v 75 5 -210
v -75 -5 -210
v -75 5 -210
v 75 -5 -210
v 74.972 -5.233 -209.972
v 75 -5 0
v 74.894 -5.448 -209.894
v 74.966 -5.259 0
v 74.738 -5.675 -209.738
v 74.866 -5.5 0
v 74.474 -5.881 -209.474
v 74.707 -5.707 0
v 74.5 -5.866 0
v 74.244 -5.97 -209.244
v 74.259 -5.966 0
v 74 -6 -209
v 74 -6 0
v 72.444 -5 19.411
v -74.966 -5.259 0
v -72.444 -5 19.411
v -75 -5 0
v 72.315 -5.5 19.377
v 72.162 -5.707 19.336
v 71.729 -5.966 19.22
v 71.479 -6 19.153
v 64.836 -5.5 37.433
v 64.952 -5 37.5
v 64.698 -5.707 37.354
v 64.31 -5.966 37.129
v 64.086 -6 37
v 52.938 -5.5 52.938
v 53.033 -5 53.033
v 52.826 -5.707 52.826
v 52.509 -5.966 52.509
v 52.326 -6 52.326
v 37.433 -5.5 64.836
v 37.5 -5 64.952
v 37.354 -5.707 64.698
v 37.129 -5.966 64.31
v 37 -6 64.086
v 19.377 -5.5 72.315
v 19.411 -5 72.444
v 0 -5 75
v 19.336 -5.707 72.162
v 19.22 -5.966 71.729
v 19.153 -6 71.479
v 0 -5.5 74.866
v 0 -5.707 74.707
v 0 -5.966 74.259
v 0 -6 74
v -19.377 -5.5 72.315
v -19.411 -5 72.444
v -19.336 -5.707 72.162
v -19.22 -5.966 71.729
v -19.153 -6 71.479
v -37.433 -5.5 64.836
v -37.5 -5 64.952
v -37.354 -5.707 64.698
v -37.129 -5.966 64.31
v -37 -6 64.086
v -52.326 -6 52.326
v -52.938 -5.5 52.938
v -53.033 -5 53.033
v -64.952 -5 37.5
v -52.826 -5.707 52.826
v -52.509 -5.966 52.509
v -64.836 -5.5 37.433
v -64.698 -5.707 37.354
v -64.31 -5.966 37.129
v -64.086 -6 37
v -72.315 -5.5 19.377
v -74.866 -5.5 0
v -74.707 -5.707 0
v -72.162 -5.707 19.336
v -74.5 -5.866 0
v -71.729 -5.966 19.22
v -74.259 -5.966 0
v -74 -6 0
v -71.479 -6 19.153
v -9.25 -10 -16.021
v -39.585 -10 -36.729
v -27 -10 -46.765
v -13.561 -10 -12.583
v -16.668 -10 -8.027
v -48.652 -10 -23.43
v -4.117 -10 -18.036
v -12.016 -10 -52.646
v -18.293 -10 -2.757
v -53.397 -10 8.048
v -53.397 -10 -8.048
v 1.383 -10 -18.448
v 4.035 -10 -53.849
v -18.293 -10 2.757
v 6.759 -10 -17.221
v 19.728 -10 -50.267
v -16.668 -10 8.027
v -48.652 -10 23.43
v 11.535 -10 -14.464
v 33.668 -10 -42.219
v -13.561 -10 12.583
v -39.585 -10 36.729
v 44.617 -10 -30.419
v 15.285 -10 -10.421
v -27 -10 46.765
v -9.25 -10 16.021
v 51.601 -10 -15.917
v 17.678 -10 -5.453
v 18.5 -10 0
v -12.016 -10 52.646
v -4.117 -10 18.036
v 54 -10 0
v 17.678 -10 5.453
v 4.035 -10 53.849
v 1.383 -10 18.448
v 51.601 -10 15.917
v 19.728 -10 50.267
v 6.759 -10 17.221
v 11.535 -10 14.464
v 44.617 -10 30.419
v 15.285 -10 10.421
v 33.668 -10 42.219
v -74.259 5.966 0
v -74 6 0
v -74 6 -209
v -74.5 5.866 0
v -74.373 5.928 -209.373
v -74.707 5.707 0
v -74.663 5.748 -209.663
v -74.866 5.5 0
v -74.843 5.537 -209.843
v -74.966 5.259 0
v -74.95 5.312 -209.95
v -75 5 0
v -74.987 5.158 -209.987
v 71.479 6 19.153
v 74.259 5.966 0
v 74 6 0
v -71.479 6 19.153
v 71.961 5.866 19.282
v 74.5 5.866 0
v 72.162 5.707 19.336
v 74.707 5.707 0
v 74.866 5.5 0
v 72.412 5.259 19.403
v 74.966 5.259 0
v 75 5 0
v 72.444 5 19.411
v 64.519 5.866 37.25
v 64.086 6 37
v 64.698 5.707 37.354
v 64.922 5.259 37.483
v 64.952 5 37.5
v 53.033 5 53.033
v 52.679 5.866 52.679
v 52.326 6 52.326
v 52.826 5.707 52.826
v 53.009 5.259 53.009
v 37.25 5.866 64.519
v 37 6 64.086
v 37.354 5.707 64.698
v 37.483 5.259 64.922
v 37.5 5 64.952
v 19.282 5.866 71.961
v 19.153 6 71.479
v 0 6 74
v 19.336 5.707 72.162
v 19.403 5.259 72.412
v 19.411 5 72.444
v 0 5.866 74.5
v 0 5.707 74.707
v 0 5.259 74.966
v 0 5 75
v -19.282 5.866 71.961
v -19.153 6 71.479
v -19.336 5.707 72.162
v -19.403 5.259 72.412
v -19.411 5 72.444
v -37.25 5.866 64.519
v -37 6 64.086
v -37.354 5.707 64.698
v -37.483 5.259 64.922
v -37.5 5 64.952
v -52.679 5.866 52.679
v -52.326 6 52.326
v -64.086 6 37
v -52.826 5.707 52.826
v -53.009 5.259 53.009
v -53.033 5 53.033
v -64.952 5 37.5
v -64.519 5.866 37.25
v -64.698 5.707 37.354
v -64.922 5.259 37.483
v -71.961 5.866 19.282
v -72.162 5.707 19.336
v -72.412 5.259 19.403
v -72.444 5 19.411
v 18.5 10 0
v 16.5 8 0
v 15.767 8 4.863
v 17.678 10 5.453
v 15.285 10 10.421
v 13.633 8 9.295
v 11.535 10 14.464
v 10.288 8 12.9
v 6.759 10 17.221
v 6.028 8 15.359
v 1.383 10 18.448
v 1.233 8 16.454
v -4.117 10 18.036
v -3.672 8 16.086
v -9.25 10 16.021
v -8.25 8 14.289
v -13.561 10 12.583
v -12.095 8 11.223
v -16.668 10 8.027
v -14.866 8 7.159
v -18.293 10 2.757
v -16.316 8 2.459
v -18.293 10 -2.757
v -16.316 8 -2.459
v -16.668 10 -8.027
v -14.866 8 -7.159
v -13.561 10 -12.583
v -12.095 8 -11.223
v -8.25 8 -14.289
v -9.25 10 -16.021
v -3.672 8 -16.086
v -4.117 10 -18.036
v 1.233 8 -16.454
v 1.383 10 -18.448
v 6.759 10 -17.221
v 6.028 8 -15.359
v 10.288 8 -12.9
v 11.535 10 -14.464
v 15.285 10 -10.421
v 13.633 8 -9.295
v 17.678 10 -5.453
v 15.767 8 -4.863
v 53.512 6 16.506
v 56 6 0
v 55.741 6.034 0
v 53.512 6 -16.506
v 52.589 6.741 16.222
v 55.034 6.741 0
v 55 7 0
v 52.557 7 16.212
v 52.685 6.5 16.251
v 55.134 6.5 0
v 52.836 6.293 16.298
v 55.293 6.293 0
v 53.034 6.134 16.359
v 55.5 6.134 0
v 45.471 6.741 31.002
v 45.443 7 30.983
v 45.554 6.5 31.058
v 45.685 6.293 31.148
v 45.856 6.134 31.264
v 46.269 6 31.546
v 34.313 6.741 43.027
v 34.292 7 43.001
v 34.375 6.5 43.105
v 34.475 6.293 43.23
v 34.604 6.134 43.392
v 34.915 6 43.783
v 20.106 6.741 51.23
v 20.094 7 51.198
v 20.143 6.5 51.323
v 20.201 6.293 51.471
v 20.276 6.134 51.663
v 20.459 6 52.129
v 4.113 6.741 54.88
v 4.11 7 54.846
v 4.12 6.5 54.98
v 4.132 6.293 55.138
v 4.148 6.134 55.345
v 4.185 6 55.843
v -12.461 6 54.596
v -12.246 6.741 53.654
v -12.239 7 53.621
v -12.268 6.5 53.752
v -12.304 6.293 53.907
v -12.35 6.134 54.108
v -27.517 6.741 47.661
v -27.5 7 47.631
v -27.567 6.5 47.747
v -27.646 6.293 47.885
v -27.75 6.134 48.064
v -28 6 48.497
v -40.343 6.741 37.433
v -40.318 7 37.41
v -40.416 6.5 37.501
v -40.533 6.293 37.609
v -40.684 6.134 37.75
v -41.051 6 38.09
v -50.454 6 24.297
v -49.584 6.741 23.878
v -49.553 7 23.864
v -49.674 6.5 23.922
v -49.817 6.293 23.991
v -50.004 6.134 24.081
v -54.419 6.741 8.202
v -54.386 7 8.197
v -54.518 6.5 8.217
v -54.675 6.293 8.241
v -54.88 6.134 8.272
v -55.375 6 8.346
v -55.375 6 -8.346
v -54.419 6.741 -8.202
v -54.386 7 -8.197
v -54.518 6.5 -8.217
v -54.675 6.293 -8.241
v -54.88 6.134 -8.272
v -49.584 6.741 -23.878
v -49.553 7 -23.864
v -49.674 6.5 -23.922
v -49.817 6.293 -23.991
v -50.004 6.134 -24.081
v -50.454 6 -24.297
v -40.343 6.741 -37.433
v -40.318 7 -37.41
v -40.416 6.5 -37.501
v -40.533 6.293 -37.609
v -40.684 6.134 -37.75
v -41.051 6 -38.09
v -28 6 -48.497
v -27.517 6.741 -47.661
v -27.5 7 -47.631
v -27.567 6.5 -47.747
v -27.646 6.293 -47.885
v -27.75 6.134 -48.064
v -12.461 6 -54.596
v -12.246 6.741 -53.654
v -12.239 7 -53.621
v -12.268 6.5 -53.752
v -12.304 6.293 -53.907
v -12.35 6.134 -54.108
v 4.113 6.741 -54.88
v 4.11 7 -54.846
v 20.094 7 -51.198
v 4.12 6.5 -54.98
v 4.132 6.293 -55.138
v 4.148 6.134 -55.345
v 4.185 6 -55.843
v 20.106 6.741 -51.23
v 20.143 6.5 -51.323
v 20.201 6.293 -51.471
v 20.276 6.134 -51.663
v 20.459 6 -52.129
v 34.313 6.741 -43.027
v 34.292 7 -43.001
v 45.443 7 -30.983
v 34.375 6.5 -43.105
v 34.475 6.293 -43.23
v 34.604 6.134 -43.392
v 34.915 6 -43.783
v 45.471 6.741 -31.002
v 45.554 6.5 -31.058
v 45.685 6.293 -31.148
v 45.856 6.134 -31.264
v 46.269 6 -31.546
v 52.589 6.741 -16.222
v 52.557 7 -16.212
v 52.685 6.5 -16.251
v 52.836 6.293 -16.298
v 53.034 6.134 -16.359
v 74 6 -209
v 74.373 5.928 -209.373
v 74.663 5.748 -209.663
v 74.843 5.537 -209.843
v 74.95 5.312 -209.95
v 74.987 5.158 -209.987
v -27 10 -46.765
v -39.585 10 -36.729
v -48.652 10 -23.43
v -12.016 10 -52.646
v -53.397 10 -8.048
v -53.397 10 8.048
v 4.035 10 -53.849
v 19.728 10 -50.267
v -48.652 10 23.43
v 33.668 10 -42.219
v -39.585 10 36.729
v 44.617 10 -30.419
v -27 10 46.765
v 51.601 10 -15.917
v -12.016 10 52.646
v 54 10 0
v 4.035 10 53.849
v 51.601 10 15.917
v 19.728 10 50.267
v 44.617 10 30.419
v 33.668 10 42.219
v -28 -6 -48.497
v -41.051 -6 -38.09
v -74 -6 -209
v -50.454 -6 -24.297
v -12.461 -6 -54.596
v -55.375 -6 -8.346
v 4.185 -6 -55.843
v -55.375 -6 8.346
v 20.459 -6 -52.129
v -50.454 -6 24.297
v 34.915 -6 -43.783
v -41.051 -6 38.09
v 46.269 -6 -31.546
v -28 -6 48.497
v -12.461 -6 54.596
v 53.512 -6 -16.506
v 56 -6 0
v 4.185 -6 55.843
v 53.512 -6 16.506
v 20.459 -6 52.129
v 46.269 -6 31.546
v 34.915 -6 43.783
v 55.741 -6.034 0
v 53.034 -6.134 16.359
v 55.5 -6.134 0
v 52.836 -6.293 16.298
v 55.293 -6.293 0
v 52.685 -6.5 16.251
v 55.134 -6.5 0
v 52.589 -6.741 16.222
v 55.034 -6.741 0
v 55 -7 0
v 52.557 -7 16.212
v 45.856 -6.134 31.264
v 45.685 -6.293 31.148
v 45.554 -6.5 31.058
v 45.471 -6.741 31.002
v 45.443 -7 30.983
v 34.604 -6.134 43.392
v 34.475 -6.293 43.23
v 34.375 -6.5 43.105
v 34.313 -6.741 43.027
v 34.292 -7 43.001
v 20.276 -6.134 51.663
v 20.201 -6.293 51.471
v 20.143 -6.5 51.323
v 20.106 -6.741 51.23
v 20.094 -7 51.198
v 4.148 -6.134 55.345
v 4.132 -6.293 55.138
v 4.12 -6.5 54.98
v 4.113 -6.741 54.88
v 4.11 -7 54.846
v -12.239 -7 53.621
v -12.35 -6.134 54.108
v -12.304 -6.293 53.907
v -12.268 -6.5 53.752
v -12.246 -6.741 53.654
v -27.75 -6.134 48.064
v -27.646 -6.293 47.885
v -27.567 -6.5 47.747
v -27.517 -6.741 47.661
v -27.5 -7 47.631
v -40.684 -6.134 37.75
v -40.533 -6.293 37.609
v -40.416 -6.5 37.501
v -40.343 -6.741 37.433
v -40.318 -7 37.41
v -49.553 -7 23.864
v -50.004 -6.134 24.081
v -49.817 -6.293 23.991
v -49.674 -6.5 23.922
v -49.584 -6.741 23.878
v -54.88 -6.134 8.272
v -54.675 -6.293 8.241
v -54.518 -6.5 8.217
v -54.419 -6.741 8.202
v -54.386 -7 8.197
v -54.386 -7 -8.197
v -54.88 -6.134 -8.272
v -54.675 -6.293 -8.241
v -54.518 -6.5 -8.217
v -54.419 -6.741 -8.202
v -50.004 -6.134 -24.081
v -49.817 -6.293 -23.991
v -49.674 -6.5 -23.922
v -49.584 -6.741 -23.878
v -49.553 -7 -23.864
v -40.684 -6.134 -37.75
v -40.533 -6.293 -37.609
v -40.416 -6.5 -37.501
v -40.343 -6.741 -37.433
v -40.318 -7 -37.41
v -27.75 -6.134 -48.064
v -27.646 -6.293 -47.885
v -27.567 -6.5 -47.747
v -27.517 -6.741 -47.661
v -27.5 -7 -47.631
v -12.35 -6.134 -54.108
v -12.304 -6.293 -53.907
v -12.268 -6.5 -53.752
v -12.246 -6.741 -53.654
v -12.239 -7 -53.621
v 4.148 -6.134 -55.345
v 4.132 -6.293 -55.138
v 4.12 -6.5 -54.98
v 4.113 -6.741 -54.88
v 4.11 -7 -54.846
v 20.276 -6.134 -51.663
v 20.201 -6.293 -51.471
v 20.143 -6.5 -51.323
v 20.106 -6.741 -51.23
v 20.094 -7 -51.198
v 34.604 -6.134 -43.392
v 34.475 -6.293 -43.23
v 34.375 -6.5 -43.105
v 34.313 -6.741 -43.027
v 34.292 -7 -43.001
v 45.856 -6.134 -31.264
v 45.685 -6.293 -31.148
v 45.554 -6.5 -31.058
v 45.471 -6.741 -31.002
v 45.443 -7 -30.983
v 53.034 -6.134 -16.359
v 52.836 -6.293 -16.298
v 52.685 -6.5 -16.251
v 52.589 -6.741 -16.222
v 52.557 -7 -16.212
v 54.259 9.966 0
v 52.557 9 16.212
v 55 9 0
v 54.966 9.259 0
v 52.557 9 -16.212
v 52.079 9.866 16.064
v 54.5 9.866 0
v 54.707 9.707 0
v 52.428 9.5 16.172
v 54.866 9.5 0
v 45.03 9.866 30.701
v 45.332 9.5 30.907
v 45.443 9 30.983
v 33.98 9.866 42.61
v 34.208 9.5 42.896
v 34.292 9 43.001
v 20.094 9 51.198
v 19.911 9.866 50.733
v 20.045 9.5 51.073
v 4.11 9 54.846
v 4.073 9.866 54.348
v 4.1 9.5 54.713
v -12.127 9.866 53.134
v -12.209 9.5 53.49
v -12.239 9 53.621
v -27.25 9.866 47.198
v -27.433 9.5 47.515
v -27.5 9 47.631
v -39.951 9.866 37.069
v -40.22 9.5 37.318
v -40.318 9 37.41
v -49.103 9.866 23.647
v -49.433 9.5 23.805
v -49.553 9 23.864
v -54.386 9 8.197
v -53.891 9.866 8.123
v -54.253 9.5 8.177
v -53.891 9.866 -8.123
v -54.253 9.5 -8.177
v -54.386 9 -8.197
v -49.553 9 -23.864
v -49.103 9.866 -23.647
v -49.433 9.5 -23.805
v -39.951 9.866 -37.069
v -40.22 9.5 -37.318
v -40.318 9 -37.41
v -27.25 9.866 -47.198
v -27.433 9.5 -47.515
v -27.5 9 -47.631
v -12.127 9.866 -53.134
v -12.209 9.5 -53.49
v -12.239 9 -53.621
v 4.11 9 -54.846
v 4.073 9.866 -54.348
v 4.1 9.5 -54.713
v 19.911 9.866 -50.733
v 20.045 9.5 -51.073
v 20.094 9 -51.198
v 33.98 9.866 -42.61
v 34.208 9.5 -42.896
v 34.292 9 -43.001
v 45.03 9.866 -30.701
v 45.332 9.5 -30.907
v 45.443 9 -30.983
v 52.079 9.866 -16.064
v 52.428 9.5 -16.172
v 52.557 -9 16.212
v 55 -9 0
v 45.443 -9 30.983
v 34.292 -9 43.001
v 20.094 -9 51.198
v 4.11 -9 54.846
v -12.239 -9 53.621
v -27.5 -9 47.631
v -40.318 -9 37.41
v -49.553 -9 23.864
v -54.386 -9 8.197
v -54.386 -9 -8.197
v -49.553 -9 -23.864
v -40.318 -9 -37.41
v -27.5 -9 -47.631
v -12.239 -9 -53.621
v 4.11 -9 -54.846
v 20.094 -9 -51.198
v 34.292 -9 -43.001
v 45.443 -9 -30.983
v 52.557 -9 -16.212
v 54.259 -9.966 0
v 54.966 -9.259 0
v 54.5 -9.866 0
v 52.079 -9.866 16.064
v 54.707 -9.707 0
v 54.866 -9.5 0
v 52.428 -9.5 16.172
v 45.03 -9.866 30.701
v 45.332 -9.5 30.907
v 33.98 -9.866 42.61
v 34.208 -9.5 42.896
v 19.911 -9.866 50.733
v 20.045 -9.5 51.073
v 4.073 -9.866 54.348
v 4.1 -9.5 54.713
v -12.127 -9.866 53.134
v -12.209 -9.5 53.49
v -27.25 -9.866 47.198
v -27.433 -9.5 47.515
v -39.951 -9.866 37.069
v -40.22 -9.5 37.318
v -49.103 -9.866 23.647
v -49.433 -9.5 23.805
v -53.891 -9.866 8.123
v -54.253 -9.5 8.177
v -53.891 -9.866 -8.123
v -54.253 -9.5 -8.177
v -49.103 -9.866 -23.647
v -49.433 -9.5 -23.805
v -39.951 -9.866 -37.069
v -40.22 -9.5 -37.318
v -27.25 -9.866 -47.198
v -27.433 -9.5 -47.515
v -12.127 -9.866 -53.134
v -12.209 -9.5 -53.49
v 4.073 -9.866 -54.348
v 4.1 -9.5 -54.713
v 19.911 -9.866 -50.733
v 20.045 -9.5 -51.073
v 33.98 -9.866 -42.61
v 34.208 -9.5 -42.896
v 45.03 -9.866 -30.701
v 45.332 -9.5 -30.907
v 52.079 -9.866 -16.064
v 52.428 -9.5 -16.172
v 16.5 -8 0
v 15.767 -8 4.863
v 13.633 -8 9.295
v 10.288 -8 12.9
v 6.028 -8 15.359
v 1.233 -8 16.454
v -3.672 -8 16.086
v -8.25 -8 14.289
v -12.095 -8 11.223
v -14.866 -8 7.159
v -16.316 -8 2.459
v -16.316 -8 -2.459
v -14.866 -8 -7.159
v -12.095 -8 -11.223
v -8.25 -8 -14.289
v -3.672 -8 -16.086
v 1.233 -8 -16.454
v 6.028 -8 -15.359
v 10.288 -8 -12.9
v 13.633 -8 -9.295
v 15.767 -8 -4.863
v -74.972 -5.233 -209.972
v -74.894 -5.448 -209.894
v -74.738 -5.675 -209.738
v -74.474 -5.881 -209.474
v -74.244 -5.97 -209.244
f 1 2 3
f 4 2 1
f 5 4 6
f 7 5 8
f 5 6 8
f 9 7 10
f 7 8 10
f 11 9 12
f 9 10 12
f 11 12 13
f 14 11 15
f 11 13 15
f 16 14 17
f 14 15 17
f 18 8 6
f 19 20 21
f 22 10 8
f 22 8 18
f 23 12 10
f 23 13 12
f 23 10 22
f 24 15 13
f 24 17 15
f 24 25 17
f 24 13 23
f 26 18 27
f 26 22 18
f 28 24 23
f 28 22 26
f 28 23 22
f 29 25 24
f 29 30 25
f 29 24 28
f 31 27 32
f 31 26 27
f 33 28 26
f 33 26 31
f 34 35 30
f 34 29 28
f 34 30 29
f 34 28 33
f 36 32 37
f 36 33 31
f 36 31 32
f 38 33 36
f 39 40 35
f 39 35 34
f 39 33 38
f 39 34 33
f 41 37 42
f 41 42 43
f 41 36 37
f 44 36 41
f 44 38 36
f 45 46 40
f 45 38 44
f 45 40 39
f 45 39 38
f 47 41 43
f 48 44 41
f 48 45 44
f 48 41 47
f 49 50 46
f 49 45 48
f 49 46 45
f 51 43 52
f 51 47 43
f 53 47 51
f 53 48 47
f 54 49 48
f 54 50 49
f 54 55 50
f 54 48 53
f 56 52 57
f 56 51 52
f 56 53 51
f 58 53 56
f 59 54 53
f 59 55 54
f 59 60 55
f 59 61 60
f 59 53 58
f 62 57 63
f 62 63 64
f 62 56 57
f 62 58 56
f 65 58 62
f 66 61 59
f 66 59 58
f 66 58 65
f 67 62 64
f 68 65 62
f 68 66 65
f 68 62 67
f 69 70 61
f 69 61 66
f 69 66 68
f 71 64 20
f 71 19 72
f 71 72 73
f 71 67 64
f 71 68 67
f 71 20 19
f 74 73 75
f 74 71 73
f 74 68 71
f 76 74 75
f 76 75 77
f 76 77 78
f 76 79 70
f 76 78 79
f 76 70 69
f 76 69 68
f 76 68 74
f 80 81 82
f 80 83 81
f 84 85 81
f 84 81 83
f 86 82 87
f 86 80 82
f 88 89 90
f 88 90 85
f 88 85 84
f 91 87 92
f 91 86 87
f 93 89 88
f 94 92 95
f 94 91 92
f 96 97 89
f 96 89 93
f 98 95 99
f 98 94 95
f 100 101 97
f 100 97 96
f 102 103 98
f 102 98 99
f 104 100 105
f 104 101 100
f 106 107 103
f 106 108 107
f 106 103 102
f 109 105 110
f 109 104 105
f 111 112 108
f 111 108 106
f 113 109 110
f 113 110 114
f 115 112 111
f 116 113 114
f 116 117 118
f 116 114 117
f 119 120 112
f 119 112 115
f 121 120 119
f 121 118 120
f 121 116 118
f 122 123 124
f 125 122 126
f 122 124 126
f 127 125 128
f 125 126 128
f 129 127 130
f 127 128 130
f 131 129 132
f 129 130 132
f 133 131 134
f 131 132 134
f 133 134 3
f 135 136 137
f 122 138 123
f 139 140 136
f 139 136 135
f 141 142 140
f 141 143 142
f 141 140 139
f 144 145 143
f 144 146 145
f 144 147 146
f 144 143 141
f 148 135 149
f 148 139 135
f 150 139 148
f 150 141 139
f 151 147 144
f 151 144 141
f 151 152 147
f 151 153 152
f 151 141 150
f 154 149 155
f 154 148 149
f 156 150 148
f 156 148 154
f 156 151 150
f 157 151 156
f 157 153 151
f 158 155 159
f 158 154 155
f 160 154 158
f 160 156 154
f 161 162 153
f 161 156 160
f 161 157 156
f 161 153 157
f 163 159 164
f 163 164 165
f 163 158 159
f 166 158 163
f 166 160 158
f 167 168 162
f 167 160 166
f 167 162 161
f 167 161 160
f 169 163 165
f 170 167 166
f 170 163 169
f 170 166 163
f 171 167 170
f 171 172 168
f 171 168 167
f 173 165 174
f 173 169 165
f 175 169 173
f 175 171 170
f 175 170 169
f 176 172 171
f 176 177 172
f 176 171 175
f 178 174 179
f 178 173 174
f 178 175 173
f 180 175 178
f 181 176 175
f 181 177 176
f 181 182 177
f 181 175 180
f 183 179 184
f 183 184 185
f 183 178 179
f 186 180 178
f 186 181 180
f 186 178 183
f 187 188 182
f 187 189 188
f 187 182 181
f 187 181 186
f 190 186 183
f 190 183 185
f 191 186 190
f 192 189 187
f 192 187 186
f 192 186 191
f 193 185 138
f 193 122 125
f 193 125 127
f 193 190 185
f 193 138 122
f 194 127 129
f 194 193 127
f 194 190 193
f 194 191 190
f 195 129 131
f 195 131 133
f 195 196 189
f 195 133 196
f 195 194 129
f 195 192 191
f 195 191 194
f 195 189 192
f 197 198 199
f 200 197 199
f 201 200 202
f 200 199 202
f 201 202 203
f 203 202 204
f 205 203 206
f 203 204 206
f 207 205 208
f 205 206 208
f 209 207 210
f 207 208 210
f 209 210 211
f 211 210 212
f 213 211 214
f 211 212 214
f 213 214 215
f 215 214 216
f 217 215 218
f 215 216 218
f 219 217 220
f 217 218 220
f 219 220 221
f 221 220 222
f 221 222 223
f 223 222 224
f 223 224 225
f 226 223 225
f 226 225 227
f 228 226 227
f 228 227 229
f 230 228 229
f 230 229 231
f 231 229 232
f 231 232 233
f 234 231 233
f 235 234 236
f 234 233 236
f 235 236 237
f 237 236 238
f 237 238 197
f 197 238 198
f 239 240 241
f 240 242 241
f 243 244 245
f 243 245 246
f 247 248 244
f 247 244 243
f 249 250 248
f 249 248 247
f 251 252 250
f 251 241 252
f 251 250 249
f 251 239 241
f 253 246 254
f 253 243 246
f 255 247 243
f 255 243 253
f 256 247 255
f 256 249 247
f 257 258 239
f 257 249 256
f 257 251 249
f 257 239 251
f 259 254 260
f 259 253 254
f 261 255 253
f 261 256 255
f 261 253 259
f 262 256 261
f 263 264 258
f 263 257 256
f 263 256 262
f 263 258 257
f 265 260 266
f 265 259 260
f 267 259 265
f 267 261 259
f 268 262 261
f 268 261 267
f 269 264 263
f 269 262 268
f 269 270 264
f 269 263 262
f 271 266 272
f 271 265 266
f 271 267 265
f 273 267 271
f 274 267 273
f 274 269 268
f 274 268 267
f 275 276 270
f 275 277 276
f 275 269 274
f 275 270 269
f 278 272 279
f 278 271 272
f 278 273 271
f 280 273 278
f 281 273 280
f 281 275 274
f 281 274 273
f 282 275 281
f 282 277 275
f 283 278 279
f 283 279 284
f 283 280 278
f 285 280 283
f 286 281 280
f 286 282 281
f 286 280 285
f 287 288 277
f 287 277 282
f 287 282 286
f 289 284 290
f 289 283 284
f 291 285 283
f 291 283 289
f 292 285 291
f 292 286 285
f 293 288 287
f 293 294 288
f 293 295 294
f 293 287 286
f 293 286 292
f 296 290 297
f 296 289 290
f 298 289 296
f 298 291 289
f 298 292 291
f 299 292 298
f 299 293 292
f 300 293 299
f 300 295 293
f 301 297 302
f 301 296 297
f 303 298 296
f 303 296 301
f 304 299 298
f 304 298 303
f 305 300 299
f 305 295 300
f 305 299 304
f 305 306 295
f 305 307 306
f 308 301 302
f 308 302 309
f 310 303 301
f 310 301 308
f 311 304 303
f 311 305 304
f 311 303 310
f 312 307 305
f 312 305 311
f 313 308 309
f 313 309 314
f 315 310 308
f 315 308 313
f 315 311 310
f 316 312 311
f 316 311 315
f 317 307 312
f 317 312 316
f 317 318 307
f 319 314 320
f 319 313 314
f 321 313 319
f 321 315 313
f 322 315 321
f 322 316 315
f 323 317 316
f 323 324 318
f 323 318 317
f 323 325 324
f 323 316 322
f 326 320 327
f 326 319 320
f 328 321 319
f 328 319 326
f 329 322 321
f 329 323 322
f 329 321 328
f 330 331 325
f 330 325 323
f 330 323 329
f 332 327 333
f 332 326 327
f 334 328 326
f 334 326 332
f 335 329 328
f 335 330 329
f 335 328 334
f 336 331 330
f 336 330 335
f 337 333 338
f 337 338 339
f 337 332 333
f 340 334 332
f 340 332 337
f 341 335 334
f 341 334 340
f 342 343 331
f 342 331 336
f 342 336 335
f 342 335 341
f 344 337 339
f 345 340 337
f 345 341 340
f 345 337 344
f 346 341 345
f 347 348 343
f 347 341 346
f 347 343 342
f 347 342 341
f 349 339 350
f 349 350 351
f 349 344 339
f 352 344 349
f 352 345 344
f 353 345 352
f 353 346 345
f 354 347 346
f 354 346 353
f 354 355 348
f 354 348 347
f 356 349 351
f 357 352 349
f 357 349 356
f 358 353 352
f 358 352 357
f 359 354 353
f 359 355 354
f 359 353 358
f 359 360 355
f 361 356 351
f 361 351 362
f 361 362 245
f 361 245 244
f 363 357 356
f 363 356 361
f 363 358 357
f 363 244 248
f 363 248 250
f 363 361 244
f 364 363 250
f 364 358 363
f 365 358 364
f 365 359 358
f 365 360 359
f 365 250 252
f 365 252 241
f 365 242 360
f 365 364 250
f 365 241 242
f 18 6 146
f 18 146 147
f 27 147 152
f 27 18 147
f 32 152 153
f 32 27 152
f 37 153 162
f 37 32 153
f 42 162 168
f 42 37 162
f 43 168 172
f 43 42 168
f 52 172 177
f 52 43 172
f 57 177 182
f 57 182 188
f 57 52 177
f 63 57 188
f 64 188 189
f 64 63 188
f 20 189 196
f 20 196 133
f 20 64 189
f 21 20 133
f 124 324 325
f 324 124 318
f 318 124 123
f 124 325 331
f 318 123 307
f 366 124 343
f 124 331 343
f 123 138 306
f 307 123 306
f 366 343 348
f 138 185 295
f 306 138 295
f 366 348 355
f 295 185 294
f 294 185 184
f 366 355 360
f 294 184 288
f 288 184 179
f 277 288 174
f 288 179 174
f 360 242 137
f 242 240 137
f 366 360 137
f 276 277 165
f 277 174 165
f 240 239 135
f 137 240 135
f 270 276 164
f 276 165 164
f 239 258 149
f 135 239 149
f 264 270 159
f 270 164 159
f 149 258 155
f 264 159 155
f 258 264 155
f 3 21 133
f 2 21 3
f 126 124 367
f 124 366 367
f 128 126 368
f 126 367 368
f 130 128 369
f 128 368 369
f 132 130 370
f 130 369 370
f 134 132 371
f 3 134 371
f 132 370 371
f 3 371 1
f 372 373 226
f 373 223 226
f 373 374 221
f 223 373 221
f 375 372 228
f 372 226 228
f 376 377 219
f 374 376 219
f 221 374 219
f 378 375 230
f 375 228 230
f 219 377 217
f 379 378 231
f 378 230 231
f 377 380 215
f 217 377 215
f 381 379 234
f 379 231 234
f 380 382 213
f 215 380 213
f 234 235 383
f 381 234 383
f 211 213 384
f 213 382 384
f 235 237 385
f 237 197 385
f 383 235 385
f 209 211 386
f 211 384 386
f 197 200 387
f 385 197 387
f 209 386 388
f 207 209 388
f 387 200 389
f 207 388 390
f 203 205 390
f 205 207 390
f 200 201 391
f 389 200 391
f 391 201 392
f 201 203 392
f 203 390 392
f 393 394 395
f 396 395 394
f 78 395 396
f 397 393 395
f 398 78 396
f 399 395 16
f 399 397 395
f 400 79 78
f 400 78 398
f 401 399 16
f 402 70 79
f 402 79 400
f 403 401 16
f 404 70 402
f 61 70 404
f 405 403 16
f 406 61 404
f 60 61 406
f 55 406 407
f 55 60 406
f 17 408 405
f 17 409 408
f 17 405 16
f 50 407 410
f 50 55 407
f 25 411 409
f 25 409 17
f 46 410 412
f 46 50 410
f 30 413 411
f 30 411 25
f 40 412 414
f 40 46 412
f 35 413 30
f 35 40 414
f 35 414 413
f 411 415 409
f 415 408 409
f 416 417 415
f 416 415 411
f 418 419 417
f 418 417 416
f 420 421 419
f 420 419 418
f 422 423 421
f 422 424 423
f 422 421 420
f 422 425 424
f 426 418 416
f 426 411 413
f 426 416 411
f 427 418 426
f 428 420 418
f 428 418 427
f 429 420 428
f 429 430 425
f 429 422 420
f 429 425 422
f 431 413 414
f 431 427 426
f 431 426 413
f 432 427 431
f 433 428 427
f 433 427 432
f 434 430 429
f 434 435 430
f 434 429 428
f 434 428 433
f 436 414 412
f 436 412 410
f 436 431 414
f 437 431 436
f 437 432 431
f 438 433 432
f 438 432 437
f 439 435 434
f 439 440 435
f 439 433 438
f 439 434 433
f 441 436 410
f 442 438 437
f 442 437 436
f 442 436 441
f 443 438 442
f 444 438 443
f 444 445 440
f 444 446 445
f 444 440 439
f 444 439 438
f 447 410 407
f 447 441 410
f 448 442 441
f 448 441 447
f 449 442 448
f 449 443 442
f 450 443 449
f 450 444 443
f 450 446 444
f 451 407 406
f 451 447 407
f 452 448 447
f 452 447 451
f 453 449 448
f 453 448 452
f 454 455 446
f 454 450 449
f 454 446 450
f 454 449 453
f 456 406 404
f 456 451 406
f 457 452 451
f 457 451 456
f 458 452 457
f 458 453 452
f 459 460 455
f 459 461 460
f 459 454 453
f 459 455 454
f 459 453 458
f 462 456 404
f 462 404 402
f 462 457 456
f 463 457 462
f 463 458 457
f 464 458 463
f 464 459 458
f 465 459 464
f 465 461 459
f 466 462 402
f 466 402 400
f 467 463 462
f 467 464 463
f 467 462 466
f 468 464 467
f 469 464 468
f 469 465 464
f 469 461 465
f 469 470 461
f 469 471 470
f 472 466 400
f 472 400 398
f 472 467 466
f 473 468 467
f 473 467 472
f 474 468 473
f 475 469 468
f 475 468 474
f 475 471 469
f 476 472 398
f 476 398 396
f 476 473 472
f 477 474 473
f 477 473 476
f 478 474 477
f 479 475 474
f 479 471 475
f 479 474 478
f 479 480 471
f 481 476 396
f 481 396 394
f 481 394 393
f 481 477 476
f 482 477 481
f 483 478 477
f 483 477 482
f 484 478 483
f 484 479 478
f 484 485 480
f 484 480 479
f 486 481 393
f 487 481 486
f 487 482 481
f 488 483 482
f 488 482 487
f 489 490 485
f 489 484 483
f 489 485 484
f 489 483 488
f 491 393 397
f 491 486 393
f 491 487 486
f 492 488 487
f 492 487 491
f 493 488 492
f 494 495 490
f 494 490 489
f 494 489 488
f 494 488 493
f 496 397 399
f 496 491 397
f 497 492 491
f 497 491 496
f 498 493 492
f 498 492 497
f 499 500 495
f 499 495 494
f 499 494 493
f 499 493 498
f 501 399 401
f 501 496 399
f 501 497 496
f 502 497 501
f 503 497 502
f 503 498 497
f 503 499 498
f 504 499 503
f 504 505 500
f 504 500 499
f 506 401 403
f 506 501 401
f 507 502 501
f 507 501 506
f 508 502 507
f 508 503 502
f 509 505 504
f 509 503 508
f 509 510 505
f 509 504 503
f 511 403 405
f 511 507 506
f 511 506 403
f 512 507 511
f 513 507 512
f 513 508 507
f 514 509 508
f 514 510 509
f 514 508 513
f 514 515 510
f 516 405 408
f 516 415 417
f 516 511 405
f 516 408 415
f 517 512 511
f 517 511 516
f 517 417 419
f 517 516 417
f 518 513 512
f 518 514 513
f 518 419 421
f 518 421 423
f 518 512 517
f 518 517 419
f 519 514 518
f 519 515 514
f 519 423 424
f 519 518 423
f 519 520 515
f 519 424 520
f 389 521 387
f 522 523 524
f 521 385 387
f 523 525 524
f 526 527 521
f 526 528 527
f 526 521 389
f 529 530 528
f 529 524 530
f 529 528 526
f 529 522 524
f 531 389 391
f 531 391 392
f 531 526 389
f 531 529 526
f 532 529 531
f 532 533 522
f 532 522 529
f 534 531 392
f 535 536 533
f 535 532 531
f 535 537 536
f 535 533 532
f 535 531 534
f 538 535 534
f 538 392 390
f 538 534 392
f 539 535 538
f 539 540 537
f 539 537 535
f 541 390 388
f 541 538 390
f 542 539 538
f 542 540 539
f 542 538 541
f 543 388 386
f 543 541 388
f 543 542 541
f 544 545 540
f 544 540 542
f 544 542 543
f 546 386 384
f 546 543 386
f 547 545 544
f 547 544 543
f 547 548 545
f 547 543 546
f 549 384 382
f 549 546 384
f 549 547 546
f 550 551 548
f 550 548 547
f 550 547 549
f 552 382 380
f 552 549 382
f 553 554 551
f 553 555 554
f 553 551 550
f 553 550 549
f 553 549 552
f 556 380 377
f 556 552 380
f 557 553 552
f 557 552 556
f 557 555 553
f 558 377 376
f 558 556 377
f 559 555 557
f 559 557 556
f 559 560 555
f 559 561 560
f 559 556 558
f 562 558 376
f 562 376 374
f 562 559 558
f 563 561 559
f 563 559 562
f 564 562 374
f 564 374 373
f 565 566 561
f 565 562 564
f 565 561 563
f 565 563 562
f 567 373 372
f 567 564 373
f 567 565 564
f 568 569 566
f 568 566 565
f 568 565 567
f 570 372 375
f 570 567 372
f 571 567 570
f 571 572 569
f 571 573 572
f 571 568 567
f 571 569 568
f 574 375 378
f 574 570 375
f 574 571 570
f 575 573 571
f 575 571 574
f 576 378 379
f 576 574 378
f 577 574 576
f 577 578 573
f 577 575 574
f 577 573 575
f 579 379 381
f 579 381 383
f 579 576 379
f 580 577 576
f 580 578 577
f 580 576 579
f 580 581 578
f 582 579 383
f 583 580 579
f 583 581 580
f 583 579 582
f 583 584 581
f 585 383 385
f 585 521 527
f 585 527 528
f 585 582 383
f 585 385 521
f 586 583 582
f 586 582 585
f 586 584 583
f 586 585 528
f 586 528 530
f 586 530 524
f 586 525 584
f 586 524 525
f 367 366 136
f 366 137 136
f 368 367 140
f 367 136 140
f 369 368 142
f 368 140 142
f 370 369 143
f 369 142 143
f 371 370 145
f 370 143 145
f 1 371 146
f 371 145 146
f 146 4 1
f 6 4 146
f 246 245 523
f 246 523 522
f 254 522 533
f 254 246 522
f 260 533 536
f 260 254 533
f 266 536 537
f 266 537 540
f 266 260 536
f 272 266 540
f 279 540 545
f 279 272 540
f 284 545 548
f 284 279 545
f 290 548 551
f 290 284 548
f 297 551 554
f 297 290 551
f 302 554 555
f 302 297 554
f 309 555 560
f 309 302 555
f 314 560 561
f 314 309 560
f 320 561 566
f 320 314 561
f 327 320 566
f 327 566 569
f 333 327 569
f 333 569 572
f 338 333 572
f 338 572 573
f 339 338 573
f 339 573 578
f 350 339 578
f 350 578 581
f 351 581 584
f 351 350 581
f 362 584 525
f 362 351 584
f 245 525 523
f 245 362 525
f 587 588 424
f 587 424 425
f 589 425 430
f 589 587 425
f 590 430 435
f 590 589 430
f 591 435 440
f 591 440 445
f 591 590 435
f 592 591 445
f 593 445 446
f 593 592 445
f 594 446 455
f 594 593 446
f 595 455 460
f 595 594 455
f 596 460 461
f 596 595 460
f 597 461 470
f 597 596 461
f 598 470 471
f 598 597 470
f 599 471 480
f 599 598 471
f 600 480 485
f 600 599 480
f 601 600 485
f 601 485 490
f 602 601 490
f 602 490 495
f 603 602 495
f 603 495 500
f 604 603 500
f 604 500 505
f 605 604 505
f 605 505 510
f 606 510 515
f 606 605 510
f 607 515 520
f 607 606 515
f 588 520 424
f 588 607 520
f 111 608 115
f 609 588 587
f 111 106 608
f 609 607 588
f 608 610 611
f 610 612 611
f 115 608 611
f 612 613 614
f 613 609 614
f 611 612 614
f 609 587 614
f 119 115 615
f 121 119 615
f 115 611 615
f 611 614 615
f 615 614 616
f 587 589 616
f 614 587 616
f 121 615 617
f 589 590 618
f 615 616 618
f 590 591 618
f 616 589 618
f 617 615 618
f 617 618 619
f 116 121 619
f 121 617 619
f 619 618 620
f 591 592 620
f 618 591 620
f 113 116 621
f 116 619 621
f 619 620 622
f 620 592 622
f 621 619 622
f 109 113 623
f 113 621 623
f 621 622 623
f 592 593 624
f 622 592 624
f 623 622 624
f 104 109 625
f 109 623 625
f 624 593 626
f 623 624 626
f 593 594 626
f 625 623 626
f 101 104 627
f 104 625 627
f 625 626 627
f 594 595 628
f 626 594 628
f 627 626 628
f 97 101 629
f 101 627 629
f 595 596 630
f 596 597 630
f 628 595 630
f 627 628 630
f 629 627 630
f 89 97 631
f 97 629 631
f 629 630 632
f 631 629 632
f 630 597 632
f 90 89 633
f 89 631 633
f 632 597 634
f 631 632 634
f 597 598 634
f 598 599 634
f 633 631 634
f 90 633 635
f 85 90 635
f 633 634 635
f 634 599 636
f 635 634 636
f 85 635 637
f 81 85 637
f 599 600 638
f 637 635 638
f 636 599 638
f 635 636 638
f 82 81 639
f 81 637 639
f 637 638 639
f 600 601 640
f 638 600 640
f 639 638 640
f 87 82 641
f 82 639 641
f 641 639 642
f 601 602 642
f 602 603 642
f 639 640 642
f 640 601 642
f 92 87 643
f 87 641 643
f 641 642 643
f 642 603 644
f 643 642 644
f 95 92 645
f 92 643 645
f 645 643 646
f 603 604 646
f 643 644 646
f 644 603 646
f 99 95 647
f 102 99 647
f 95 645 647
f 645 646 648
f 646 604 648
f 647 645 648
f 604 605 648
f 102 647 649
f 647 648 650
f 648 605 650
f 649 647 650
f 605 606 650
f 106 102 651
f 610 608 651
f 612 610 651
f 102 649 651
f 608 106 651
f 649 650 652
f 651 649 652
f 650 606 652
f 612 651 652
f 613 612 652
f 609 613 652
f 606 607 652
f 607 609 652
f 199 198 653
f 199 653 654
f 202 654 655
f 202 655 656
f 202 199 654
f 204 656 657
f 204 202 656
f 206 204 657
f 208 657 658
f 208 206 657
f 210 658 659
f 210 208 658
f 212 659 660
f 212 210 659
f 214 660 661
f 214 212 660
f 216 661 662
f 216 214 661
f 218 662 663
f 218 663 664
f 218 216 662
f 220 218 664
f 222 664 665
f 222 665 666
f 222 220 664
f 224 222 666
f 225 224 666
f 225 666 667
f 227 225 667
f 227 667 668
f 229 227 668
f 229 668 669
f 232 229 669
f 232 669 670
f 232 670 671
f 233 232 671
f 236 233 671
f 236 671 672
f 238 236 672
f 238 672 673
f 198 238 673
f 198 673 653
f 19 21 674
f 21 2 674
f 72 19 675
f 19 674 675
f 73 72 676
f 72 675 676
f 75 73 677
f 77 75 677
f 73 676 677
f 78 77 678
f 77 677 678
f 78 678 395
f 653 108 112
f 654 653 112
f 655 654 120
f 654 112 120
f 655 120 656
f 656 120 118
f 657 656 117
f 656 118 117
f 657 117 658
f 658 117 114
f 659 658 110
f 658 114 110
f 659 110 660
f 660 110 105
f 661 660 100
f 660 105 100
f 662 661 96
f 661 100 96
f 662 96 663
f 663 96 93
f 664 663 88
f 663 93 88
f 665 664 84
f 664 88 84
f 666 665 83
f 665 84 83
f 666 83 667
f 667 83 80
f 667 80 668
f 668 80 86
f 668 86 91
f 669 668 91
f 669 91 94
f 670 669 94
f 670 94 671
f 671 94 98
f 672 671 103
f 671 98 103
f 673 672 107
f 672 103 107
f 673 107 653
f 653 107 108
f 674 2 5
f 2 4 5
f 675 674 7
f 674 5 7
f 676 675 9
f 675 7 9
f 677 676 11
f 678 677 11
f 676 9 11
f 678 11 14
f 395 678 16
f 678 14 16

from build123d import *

# Parameters (mm, degrees)
F0_R     = 55
F1_DEPTH = 6
F0_R_2   = 16.5
F2_DEPTH = 10
F3_SIZE  = 2
F4_R     = 1
F5_R     = 1


with BuildPart() as f1:
    # F0 (on Front) → F1 (new body, symmetric)
    with BuildSketch(Plane.XZ):
        with BuildLine():
            Line((75, -210), (75, 0))
            ThreePointArc((75, 0), (0, 75), (-75, 0))
            Line((-75, 0), (-75, -210))
            Line((-75, -210), (75, -210))
        make_face()
        Circle(F0_R, mode=Mode.SUBTRACT)
    extrude(amount=F1_DEPTH, both=True)

    # F0 (on Front) → F2 (join, symmetric)
    with BuildSketch(Plane.XZ):
        Circle(F0_R)
        Circle(F0_R_2, mode=Mode.SUBTRACT)
    extrude(amount=F2_DEPTH, both=True)

    # F3
    f3_edges = [f1.edges().sort_by_distance(p)[0] for p in [
        (-16.5, -10, 0),
        (-16.5, 10, 0),
    ]]
    chamfer(f3_edges, length=F3_SIZE)

    # F4
    f4_edges = [f1.edges().sort_by_distance(p)[0] for p in [
        (-55, 10, 0),
        (-75, 6, -105),
        (0, 6, -210),
        (75, 6, -105),
        (0, 6, 75),
        (-55, 6, 0),
        (-75, -6, -105),
        (0, -6, -210),
        (75, -6, -105),
        (0, -6, 75),
        (-55, -6, 0),
    ]]
    fillet(f4_edges, radius=F4_R)

    # F5
    f5_edges = [f1.edges().sort_by_distance(p)[0] for p in [
        (-55, -10, 0),
    ]]
    fillet(f5_edges, radius=F5_R)


solid = f1.part
